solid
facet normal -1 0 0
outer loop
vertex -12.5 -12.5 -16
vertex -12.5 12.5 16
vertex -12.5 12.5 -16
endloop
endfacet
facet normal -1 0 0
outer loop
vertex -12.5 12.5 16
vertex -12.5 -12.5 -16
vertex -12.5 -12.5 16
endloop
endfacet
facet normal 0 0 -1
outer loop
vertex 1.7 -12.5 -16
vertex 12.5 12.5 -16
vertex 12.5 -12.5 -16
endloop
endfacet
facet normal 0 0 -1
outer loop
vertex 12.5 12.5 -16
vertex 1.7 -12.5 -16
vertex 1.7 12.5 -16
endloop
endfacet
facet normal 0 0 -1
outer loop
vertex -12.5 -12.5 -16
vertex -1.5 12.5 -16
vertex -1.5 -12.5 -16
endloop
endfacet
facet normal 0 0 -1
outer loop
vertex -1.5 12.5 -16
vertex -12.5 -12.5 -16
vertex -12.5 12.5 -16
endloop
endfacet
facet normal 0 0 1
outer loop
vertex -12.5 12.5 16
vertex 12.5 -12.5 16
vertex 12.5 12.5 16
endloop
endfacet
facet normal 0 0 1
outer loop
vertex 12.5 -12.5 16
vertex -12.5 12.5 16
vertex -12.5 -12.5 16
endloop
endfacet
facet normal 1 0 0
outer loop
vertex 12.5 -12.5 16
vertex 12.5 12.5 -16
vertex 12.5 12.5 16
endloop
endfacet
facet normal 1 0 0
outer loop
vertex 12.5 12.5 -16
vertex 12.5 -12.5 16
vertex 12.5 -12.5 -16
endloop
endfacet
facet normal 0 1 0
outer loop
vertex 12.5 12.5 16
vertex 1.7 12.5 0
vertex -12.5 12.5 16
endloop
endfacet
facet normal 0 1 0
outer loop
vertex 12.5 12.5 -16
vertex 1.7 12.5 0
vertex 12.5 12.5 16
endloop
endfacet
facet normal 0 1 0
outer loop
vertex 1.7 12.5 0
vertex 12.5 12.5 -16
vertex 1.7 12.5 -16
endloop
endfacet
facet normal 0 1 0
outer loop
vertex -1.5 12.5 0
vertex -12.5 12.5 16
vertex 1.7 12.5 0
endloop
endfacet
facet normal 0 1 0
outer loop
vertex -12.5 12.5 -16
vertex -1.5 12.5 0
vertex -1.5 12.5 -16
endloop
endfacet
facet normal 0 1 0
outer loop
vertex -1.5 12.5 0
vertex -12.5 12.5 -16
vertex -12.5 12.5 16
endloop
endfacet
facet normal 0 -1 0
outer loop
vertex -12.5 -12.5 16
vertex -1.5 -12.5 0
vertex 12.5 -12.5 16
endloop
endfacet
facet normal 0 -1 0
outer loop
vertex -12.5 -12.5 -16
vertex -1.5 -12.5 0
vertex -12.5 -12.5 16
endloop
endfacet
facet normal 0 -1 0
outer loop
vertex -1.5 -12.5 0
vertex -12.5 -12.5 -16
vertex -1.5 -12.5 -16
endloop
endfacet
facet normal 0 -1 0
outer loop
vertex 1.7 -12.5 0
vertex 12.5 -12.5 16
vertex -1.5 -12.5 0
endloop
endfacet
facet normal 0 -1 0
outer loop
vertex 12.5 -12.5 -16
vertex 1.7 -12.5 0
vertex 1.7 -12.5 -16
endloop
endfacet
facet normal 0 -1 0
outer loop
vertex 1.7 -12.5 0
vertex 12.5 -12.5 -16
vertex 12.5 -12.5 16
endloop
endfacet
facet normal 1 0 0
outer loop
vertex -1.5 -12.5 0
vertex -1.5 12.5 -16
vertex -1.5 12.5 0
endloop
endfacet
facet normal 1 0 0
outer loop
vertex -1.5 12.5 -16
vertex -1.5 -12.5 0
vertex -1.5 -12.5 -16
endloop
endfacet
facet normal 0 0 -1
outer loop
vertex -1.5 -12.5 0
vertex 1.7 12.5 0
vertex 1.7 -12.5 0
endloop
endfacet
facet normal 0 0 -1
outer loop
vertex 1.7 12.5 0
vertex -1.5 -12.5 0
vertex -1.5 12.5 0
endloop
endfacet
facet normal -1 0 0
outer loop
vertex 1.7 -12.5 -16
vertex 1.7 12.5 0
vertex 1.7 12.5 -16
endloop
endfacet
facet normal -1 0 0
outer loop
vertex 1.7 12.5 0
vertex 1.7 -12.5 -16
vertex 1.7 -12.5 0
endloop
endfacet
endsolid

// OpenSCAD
//Montage Hilfe Regalschiene
//20190128 P. de Graaff

//slot in mm
slot=3;
//gap in mm
gap=0.2;
//shelf board thickness in mm
shelf_board_thickness=16;

rotate([0,180,0])difference(){
    cube([25,25,2*shelf_board_thickness],center=true);
    translate([-(slot/2+gap),-15,0])cube([slot+gap,30,shelf_board_thickness+1]);
}
